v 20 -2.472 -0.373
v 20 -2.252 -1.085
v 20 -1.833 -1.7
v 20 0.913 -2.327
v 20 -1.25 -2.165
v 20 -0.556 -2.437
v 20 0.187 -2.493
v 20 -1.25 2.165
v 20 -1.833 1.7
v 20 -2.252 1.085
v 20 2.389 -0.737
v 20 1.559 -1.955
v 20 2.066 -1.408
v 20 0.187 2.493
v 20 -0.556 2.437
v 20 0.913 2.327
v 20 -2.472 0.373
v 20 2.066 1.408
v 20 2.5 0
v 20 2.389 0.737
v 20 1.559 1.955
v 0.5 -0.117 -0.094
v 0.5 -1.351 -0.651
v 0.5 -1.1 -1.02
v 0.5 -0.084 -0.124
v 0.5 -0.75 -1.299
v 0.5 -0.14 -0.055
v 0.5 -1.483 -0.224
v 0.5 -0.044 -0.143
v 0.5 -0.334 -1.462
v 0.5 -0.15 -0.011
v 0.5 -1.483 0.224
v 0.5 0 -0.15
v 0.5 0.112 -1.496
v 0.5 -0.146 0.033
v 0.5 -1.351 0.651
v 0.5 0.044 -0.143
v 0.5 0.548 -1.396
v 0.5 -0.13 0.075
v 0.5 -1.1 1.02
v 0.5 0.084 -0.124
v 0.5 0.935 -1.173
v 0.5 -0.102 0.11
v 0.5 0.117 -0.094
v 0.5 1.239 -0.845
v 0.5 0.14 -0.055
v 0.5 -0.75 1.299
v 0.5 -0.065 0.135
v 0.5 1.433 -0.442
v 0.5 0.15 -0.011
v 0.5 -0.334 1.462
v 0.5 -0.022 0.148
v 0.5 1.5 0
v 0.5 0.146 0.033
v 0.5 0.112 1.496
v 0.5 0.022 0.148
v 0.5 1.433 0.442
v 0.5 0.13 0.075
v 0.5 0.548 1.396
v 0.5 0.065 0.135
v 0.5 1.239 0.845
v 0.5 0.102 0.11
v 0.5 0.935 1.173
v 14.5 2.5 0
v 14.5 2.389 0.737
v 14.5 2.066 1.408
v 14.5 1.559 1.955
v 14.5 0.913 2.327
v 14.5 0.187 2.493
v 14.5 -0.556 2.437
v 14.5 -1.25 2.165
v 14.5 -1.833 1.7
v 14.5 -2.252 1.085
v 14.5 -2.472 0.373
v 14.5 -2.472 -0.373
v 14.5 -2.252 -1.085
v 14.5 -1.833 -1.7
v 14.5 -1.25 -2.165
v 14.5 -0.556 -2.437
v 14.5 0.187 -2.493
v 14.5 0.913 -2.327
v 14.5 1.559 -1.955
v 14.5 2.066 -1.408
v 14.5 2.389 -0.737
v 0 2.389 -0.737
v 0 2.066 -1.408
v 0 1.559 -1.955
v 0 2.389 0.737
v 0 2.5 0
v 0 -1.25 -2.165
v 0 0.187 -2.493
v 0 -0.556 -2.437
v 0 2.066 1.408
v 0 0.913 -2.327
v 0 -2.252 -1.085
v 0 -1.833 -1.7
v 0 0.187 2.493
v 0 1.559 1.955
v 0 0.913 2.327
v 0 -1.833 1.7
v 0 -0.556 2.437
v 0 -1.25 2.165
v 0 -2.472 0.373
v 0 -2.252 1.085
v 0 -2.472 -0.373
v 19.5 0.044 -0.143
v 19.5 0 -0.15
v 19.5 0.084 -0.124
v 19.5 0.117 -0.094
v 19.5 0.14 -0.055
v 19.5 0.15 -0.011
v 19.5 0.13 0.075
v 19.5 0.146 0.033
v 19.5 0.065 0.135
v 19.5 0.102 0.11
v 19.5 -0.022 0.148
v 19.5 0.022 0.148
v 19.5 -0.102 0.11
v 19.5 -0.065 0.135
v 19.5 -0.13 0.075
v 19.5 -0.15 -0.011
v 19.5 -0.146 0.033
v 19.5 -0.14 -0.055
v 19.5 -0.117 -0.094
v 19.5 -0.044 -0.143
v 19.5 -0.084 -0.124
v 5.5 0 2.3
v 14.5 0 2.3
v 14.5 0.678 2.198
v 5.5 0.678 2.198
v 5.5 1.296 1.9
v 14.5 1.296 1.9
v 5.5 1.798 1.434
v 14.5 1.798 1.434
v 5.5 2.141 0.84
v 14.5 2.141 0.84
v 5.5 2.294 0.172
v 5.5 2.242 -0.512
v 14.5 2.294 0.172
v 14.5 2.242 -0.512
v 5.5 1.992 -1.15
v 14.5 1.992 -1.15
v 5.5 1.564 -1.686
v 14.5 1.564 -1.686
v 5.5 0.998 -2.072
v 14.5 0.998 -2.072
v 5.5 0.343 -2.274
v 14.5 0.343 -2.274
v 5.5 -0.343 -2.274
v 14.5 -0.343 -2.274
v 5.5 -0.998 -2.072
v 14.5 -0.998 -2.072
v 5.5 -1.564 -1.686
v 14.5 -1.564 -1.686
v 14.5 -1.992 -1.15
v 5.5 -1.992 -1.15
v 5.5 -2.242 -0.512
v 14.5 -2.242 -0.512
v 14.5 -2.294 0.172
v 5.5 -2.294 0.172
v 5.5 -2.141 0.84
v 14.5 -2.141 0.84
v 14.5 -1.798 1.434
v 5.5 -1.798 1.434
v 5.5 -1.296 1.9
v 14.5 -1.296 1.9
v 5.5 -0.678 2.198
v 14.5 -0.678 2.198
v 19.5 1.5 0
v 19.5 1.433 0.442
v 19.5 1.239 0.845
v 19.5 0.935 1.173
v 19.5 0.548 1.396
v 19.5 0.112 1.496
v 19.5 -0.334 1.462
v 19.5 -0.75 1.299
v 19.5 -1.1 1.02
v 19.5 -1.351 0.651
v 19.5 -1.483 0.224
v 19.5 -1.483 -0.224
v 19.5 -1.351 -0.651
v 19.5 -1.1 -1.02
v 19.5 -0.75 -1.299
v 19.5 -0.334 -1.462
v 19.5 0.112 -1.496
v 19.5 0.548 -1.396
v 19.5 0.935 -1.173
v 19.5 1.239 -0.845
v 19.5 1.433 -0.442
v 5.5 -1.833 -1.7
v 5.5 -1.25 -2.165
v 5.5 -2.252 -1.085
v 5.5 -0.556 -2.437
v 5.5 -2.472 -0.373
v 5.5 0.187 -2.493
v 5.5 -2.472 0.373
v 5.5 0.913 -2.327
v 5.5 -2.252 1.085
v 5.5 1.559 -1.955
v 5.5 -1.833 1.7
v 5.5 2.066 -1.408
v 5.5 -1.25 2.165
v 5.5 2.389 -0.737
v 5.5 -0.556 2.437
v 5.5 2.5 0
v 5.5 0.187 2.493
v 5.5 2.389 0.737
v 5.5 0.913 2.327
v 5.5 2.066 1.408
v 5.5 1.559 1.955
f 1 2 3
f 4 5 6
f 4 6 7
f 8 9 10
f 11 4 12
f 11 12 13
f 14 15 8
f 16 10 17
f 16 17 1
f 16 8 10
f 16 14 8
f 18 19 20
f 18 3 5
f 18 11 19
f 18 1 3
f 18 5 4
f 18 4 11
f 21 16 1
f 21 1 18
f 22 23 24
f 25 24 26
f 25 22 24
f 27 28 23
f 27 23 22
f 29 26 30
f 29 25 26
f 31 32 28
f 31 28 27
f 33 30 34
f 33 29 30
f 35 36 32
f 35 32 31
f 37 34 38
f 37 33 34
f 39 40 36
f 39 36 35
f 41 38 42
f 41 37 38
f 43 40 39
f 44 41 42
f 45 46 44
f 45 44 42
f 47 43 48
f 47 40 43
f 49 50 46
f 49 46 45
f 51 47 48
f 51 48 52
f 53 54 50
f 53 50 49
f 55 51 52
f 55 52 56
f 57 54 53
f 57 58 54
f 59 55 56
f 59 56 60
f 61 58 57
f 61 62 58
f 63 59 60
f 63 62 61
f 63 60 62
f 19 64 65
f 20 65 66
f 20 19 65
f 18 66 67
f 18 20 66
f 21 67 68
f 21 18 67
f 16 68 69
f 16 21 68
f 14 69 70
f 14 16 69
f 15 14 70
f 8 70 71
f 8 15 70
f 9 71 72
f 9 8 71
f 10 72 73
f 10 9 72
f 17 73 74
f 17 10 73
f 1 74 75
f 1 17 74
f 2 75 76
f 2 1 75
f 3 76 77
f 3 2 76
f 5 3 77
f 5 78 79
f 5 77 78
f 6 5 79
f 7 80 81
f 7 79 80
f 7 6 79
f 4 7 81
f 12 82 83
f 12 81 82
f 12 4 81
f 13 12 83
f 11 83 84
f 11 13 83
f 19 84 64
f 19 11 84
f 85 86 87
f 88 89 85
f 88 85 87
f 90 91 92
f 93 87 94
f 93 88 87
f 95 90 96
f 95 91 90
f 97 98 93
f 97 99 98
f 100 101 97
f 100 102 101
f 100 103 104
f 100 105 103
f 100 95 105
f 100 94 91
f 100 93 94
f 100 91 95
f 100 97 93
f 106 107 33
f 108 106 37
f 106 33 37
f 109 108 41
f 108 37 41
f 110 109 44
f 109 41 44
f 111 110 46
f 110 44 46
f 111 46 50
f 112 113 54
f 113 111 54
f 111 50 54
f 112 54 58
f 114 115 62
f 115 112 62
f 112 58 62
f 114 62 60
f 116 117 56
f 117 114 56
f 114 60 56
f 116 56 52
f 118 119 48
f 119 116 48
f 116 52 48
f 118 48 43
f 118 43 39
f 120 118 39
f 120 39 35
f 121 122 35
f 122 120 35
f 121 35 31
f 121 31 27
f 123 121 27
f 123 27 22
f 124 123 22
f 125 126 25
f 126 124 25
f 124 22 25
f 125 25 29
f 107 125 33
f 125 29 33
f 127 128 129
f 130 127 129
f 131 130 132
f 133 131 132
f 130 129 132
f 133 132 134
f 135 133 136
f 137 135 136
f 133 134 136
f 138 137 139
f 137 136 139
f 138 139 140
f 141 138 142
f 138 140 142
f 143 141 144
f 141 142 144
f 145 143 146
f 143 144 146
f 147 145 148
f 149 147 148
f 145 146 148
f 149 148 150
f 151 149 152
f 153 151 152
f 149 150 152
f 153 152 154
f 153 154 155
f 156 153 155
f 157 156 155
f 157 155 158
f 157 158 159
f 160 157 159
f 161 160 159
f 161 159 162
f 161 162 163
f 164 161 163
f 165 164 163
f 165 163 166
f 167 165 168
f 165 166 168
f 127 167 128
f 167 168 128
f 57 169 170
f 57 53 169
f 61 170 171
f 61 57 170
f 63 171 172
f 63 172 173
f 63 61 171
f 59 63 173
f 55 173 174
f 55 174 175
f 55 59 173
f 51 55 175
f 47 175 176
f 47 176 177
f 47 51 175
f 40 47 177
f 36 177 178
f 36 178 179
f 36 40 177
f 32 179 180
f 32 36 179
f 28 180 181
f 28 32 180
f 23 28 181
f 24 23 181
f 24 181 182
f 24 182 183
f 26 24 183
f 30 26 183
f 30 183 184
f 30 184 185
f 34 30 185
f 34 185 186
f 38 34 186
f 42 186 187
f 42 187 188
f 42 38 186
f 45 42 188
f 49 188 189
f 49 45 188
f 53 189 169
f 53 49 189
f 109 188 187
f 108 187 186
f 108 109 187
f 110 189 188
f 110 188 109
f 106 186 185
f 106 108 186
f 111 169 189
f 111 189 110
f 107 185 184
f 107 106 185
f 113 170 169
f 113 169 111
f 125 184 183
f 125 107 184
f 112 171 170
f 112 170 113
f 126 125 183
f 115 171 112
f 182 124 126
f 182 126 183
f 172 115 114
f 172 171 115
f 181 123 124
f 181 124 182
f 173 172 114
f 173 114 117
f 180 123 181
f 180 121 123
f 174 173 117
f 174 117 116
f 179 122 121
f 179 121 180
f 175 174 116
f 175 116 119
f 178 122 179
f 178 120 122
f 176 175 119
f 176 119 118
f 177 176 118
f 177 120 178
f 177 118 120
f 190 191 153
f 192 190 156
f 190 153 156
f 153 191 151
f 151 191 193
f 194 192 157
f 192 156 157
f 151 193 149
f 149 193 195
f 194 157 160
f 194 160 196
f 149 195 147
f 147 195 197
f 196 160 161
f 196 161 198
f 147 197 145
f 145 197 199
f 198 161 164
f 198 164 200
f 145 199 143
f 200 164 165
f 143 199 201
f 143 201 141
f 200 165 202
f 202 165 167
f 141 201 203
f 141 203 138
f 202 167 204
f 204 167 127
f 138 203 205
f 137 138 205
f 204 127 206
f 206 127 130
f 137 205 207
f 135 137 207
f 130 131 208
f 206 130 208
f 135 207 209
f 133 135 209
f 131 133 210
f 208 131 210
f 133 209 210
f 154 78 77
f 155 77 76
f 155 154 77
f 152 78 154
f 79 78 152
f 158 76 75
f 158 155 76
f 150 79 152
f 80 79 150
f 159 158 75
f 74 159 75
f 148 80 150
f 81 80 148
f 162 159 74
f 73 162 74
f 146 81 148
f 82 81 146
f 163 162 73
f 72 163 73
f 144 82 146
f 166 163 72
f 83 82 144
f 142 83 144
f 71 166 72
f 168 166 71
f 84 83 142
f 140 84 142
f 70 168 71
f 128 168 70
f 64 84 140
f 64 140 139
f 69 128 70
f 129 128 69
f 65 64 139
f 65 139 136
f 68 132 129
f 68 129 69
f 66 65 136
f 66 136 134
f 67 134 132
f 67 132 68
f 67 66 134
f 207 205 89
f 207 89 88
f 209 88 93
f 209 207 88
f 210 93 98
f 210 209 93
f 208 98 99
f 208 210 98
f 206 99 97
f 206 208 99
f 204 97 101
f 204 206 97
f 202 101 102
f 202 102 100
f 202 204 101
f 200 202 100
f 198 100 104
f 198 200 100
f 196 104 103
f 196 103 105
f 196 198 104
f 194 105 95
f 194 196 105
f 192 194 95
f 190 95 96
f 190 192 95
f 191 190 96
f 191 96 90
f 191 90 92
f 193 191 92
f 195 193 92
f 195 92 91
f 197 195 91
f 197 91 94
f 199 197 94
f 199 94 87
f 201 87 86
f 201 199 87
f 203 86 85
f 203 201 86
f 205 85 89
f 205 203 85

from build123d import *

# Parameters (mm, degrees)
CUT_EXTRUDE1_START  = -14.5
SKETCH2_R           = 2.5
SKETCH2_R_2         = 2.3
CUT_EXTRUDE1_DEPTH  = 9
BOSS_EXTRUDE2_REACH = 21.818
SKETCH3_R           = 0.15


# Read off the part's stored shape, not the designer's step: Extrude-Thin1
with BuildPart() as part:
    # Extrude-Thin1 outline → Extrude-Thin1 (revolve)
    with BuildSketch(Plane.YX):
        Polygon((2.5, 20), (0, 20), (0, 19.5), (1.5, 19.5), (1.5, 0.5), (0, 0.5), (0, 0), (2.5, 0), align=None)
    revolve(axis=Axis((0, 0, 0), (1, 0, 0)))

    # Sketch2 → Cut-Extrude1 (cut)
    with BuildSketch(Plane.ZY.offset(CUT_EXTRUDE1_START)):
        Circle(SKETCH2_R)
        Circle(SKETCH2_R_2, mode=Mode.SUBTRACT)
    extrude(amount=CUT_EXTRUDE1_DEPTH, mode=Mode.SUBTRACT)

    # Sketch3 → Boss-Extrude2 (add, up to next)
    with BuildSketch(Plane(origin=(0.5, 0, 0), x_dir=(0, 0, -1), z_dir=(1, 0, 0)), mode=Mode.PRIVATE) as boss_extrude2_sk1:
        Circle(SKETCH3_R)
    boss_extrude2_tool1 = extrude(boss_extrude2_sk1.sketch, amount=BOSS_EXTRUDE2_REACH, mode=Mode.PRIVATE) - part.part
    add(boss_extrude2_tool1.solids().sort_by_distance((0.5, 0, 0))[0])


solid = part.part
